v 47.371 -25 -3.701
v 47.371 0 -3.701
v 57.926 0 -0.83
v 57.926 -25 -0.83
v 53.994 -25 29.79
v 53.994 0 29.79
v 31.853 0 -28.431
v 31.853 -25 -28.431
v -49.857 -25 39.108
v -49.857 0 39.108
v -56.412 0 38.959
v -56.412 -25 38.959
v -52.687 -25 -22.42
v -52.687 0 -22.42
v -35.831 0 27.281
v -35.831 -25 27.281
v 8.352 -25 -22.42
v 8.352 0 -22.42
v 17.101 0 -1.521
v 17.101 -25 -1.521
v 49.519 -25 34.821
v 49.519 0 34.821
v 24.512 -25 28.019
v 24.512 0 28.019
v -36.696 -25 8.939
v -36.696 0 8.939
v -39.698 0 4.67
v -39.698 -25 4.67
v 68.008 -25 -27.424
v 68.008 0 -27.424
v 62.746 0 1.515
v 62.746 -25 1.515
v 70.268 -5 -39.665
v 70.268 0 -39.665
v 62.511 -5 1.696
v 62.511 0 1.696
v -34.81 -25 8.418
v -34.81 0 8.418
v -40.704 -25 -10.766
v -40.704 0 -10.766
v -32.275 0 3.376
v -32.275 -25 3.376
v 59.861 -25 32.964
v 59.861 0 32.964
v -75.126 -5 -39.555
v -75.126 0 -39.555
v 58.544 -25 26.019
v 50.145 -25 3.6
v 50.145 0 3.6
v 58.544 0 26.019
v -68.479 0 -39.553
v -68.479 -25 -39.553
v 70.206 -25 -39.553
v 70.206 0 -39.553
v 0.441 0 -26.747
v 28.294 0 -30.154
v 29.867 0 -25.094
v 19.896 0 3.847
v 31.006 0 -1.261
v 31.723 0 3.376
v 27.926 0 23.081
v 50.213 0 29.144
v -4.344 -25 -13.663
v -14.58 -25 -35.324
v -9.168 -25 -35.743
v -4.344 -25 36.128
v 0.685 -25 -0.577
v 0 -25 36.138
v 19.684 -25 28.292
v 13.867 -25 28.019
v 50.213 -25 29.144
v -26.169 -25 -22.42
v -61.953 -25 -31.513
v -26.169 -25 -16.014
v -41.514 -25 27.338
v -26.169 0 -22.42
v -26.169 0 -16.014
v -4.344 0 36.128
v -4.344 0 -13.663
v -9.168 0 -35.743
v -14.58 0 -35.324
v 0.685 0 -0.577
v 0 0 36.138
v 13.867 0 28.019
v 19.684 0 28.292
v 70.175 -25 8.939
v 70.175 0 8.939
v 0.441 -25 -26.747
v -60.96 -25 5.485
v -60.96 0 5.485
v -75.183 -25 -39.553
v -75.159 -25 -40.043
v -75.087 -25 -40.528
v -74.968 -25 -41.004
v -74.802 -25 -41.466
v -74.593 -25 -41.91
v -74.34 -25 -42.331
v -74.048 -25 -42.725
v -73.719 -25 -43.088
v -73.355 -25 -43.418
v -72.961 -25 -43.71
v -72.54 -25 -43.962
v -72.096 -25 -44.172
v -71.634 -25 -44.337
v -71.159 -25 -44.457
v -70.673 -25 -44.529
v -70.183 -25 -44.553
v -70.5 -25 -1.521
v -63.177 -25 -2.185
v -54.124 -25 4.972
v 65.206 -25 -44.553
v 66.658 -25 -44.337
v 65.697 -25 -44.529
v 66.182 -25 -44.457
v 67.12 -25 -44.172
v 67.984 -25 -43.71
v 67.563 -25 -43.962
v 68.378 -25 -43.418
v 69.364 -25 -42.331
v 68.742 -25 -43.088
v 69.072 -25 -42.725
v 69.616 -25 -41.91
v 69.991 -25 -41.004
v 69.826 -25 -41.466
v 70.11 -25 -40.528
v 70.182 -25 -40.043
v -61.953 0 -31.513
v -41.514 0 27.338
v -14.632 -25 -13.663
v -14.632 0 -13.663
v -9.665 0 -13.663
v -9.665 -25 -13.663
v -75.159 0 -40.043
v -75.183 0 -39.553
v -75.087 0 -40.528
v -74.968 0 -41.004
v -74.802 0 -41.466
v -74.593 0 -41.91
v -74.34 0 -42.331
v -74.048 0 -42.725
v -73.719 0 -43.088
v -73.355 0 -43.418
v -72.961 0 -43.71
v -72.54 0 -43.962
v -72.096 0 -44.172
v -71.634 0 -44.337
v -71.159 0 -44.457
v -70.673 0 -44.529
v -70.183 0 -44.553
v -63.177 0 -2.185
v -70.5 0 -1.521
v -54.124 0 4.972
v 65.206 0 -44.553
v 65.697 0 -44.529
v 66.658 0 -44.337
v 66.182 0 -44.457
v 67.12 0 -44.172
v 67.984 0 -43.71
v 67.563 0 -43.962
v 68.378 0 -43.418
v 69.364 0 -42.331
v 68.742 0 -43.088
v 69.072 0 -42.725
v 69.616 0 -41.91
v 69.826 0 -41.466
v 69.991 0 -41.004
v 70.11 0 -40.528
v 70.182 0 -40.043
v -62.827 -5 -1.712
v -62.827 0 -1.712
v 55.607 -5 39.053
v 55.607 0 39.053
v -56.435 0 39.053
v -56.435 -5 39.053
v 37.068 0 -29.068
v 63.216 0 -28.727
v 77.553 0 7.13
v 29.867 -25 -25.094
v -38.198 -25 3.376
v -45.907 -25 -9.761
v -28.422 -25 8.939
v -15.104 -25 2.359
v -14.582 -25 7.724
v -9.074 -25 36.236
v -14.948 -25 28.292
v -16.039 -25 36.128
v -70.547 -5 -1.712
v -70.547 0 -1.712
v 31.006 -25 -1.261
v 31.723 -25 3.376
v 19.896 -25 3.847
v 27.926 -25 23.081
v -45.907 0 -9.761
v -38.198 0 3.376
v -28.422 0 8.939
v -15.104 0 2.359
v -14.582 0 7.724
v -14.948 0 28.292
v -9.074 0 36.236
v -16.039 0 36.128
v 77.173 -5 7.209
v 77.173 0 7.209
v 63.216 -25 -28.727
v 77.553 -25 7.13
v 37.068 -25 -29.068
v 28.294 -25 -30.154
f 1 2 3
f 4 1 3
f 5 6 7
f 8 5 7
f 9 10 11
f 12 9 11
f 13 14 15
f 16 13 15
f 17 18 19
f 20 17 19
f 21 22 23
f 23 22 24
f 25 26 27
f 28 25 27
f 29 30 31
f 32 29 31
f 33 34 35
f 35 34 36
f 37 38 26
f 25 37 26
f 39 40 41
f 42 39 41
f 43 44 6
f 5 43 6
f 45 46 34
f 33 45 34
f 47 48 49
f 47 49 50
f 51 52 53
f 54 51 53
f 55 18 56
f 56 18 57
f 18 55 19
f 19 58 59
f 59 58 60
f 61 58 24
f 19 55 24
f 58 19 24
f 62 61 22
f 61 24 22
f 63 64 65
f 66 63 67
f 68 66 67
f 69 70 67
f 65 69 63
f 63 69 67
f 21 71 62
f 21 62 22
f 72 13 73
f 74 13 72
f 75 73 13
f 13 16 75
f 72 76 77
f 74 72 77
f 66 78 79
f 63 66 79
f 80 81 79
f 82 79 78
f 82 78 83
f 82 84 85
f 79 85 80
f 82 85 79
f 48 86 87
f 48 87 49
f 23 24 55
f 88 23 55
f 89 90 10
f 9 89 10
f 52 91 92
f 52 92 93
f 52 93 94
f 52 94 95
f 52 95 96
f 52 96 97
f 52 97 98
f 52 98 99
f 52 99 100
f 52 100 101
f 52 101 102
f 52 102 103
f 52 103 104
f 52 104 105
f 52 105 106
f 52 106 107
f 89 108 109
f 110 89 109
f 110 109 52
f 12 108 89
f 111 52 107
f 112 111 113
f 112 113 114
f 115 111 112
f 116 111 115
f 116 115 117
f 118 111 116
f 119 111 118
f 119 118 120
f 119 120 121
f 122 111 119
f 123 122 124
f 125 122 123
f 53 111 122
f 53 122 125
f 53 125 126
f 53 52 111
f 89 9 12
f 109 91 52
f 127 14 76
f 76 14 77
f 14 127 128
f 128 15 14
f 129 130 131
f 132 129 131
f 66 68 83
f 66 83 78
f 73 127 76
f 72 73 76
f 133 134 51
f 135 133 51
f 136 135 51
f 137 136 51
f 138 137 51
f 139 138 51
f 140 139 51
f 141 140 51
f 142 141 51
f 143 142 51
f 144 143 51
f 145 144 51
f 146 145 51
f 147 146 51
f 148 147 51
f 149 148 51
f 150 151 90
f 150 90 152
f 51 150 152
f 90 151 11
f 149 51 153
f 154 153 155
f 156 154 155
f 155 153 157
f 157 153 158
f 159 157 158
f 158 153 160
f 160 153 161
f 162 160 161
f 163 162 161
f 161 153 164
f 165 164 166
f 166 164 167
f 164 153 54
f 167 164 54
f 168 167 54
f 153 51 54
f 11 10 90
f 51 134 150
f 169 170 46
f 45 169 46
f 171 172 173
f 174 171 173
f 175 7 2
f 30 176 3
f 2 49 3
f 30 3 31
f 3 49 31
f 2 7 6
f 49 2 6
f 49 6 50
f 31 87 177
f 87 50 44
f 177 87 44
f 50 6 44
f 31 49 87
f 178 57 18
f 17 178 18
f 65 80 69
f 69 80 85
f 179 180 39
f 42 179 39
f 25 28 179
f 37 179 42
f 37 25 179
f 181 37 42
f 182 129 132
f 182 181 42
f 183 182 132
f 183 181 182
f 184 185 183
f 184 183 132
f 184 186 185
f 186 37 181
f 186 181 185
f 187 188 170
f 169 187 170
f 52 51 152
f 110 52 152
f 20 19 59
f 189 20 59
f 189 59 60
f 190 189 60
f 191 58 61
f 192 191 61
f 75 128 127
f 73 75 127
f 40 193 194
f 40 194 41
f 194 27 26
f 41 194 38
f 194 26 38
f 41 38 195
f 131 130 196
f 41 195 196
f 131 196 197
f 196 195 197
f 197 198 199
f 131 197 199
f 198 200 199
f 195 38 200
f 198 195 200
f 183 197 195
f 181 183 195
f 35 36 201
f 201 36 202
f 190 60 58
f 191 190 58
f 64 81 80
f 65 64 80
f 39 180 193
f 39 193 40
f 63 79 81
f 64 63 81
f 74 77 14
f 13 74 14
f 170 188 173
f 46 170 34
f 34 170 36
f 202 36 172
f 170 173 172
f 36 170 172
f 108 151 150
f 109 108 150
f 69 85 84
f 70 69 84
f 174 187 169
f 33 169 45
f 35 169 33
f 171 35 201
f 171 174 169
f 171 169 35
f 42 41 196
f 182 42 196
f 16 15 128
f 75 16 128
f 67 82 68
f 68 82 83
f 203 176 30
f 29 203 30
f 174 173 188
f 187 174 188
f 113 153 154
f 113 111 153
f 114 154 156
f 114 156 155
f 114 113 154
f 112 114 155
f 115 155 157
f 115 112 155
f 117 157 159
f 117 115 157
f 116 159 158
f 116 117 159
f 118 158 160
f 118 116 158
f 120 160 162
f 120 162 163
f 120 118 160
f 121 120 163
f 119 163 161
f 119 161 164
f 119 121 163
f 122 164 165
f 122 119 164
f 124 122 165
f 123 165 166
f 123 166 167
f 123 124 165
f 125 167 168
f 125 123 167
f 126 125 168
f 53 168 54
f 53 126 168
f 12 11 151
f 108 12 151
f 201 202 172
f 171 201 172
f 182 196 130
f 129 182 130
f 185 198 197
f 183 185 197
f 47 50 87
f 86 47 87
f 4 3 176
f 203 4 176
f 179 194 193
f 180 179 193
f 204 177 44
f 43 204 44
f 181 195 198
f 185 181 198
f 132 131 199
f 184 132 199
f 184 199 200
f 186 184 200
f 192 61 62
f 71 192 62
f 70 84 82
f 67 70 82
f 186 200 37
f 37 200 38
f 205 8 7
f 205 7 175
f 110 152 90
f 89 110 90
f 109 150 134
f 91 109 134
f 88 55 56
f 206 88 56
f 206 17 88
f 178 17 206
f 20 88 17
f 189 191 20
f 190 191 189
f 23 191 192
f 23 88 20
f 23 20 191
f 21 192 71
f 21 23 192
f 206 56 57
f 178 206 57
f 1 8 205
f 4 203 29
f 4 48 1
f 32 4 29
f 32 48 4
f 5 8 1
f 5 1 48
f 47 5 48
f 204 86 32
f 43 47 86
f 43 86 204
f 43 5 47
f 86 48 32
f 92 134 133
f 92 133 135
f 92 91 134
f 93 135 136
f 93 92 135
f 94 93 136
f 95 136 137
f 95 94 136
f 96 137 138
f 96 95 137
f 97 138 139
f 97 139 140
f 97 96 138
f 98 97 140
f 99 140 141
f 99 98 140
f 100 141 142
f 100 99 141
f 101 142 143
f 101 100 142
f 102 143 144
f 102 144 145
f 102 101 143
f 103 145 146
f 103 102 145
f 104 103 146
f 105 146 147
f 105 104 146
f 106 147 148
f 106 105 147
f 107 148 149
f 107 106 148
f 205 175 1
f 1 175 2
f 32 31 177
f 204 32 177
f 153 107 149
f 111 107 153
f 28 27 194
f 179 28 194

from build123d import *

# Parameters (mm, degrees)
F1_DEPTH = 25
F2_W     = 145.3895270824
F2_H     = 25
F3_DEPTH = 5
F5_DEPTH = 5
F6_R     = 4.99999


# Not quite as in the source:
# - a fillet or chamfer is up to 0.001 mm smaller than in the source, because OpenCascade refuses the exact size


with BuildPart() as f1:
    # F0 (on Front) → F1 (new body)
    with BuildSketch(Plane.XZ):
        Polygon((-49.8568192124, 39.1075946391), (-56.4118437469, 38.9586128294), (-70.5003495435, -1.5205583768), (-63.176676631, -2.1846769378), (-75.1830488443, -39.5527109504), (-68.4790462255, -39.5527109504), (-54.1241802275, 4.9719237722), (-60.960277915, 5.4854331538), align=None)
    extrude(amount=F1_DEPTH)

    # F2 (on face) → F3 (join)
    with BuildSketch(Plane(origin=(0, 0, -39.5527109504), x_dir=(1, 0, 0), z_dir=(0, 0, -1))):
        with Locations((-2.4882853031, 12.5)):
            Rectangle(F2_W, F2_H)
    extrude(amount=F3_DEPTH)

    # F6 (radius 5 in the source; OpenCascade refuses exactly that, so slightly less here)
    f6_edges = [f1.edges().sort_by_distance(p)[0] for p in [
        (70.206478, -12.5, -44.552711),
        (-75.183049, -12.5, -44.552711),
    ]]
    fillet(f6_edges, radius=F6_R)


with BuildPart() as f1b:
    # F0 (on Front) → F1, piece 2 (new body)
    with BuildSketch(Plane.XZ):
        Polygon((-52.687395364, -22.4202554673), (-35.8314104378, 27.2812079638), (-41.5140576661, 27.3383427411), (-61.9532987475, -31.5132625401), (-26.1693410575, -22.4202554673), (-26.1693410575, -16.0142090172), align=None)
    extrude(amount=F1_DEPTH)


with BuildPart() as f1c:
    # F0 (on Front) → F1, piece 3 (new body)
    with BuildSketch(Plane.XZ):
        Polygon((-9.0740518644, 36.2361818552), (-16.0388462245, 36.1280366778), (-34.8100550473, 8.4181567654), (-36.6958837116, 8.9390994981), (-39.6980270743, 4.6696574427), (-38.1983165081, 3.3758431673), (-45.9069944918, -9.7606536001), (-40.7042652369, -10.7657248154), (-32.274659742, 3.3758431673), (-15.1044856757, 2.3593353108), (-14.6315097809, -13.66269961), (-9.6652712673, -13.66269961), align=None)
        Polygon((-14.9480281398, 28.2920897007), (-14.5817017183, 7.7237756923), (-28.4223798662, 8.9390994981), align=None, mode=Mode.SUBTRACT)
    extrude(amount=F1_DEPTH)


with BuildPart() as f1d:
    # F0 (on Front) → F1, piece 4 (new body)
    with BuildSketch(Plane.XZ):
        Polygon((0, 36.1379608512), (-4.3442999013, 36.1280366778), (-4.3442999013, -13.66269961), (-14.5799871534, -35.3235378861), (-9.1679766774, -35.7429459691), (19.6837689728, 28.2920897007), (13.8670681044, 28.0186552554), (0.6849662168, -0.5772078293), align=None)
    extrude(amount=F1_DEPTH)


with BuildPart() as f1e:
    # F0 (on Front) → F1, piece 5 (new body)
    with BuildSketch(Plane.XZ):
        Polygon((50.2130747932, 29.1436510876), (49.5194196701, 34.8208174109), (24.5116390288, 28.0186552554), (0.4405695072, -26.747237891), (28.2942693621, -30.153506403), (29.8667065799, -25.0938124955), (8.352403529, -22.4202554673), (17.101412639, -1.5205583768), (31.0057803671, -1.2611554515), (31.722612679, 3.3758431673), (19.8963228613, 3.847383894), (27.9255900532, 23.0814144015), align=None)
    extrude(amount=F1_DEPTH)


with BuildPart() as f1f:
    # F0 (on Front) → F1, piece 6 (new body)
    with BuildSketch(Plane.XZ):
        Polygon((59.8610974848, 32.9642109573), (53.9944581687, 29.7904536128), (31.8534656095, -28.4306296104), (37.0677597821, -29.0682930499), (47.3705790937, -3.7012356333), (57.9263914569, -0.8300353294), (63.2158815861, -28.7272930145), (68.0079700506, -27.4238361718), (62.7463310957, 1.5151726548), (77.5532349944, 7.1303225122), align=None)
        Polygon((50.1446537673, 3.5999426618), (58.5438013077, 26.0186325759), (70.1747397517, 8.9390994981), align=None, mode=Mode.SUBTRACT)
    extrude(amount=F1_DEPTH)


with BuildPart() as f5:
    # F4 (on Front) → F5 (new body)
    with BuildSketch(Plane.XZ):
        Polygon((-62.827283707, -1.7116093077), (-75.1262456179, -39.5546890795), (70.2679157257, -39.6652817726), (62.5108405948, 1.6957151238), (77.1726742387, 7.2090495378), (55.6068457663, 39.0533618629), (-56.435116975, 39.0533618629), (-70.547408027, -1.7116093077), align=None)
    extrude(amount=F5_DEPTH)


solid = Compound([f1.part, f1b.part, f1c.part, f1d.part, f1e.part, f1f.part, f5.part])
